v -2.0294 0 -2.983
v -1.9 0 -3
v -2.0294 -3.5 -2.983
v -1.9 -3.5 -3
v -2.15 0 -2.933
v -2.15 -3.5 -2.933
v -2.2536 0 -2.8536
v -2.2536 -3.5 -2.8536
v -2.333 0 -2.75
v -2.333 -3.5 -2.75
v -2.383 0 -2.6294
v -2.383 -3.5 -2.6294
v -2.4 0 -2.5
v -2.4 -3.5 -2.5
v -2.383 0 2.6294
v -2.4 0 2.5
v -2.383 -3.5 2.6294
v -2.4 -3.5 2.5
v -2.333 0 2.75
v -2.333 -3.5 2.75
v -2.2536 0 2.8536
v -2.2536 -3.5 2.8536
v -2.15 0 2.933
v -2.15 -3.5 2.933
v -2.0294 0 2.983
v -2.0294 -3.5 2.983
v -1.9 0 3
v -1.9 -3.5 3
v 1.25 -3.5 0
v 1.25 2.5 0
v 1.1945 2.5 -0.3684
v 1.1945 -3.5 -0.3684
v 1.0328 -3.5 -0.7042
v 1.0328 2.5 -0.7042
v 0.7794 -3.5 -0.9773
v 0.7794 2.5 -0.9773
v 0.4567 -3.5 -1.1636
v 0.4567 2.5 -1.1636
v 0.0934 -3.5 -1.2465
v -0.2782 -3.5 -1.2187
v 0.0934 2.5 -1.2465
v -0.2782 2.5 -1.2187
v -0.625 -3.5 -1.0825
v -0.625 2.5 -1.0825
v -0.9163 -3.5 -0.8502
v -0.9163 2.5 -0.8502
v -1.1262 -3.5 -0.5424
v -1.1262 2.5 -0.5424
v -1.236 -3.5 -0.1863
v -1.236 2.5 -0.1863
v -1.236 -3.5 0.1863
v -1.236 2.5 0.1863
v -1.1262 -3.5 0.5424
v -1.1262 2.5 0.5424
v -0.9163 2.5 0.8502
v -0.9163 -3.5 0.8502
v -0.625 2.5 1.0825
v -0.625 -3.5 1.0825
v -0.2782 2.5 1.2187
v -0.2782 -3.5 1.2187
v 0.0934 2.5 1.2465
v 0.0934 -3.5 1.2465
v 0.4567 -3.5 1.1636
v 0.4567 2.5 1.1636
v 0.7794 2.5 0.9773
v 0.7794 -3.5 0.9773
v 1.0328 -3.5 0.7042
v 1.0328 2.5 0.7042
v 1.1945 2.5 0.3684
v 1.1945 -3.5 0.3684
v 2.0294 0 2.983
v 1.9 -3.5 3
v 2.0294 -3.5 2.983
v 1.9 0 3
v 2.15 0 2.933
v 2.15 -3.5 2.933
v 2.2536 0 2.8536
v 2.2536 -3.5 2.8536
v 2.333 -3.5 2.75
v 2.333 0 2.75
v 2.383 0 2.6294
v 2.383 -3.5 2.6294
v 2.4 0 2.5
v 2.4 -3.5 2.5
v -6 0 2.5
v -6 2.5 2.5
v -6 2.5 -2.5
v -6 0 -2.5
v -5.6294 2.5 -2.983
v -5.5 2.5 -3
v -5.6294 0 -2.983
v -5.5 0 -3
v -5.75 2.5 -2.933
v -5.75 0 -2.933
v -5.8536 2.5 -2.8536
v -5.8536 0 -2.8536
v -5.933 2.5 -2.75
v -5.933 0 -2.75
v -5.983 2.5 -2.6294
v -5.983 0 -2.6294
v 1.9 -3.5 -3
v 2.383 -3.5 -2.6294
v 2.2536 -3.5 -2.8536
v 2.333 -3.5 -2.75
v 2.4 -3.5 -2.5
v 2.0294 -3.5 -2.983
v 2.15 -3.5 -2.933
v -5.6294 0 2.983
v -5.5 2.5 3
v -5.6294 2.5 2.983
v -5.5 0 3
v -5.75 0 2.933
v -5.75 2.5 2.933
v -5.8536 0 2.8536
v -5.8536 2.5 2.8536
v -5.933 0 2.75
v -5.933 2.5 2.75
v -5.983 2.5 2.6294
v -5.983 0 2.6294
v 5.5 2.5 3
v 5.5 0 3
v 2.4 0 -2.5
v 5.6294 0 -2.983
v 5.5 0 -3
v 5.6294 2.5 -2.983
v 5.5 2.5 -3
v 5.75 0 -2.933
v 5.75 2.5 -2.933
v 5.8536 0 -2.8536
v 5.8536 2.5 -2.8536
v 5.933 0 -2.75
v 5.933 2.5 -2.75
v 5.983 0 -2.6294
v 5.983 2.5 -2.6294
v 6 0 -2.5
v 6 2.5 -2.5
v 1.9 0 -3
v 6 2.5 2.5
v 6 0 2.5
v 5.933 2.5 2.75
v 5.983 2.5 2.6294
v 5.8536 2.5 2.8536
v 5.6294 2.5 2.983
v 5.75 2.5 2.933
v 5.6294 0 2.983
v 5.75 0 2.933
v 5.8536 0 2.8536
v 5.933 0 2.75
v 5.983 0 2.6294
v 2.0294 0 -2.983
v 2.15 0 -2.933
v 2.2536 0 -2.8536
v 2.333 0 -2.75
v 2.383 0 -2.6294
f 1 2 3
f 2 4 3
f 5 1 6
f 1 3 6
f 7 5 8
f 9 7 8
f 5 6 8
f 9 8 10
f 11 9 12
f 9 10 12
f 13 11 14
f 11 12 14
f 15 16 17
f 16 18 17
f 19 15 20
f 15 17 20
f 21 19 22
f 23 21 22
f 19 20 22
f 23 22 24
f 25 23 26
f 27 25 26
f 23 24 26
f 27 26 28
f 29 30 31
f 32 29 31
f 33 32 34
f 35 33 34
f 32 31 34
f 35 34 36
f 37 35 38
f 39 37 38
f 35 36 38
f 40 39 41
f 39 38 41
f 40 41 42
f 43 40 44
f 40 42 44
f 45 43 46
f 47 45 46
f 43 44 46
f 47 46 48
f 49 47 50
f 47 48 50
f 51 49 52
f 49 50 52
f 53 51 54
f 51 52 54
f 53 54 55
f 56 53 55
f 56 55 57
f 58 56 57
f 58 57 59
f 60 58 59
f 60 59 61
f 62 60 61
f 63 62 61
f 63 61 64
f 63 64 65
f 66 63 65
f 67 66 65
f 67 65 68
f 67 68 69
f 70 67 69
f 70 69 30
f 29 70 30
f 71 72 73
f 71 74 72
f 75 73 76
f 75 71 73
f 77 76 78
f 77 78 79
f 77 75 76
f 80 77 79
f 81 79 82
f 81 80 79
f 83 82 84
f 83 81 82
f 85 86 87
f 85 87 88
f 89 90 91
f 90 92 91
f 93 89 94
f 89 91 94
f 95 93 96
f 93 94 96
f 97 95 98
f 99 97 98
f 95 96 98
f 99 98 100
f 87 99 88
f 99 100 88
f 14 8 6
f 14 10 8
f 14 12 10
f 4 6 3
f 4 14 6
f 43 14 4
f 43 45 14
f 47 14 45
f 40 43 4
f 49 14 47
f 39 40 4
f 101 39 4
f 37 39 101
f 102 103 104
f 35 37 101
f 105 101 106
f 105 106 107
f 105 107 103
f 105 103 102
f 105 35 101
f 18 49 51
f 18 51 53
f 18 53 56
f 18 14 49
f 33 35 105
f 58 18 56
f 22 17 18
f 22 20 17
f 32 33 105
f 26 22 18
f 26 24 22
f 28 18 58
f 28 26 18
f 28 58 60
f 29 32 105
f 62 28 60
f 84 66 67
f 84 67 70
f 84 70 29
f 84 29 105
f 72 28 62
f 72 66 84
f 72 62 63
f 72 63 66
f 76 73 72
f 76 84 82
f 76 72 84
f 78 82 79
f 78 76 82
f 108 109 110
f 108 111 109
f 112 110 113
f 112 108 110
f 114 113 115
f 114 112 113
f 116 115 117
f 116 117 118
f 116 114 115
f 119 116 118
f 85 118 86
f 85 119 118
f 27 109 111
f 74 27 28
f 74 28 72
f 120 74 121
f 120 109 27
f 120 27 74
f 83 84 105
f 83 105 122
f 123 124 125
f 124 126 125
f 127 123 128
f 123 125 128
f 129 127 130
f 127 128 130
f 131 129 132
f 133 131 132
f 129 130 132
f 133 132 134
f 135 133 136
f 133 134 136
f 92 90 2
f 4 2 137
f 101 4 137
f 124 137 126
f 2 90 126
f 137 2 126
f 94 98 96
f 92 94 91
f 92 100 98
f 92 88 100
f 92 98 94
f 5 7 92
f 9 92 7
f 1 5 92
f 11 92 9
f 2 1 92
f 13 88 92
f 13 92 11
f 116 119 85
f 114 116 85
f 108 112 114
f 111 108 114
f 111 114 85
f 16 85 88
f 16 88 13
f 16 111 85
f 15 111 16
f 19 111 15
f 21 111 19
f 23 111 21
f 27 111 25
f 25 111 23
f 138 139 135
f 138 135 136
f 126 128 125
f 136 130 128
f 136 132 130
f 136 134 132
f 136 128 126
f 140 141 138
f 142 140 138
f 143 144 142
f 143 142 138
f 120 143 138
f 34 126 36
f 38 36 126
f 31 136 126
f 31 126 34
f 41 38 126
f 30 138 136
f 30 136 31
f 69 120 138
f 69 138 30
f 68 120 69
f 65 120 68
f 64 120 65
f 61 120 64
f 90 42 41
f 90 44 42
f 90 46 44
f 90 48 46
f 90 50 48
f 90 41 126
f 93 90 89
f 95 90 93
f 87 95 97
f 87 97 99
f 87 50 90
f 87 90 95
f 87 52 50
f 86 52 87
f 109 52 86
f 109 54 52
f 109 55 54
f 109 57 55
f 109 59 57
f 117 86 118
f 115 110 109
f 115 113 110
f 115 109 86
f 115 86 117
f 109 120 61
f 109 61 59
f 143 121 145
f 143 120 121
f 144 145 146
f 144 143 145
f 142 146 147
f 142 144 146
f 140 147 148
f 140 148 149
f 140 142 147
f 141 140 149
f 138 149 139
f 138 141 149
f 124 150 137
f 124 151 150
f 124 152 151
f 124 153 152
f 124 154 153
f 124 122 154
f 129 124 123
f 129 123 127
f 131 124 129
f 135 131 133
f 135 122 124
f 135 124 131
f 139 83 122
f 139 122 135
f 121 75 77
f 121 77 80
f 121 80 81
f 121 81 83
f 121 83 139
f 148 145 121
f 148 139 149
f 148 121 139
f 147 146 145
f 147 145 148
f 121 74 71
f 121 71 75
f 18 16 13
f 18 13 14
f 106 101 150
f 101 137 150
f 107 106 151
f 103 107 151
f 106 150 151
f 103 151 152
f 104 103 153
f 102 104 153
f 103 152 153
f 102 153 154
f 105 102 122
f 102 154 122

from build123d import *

# Parameters (mm, degrees)
BOSS_EXTRU_1_DEPTH      = 3
ESQUISSE2_R             = 1.25
ENL_V_MAT_EXTRU_1_DEPTH = 7
CONG_2_R                = 0.5


with BuildPart() as part:
    # Esquisse1 → Boss.-Extru.1 (new body, symmetric)
    with BuildSketch(Plane.XY):
        Polygon((-6, 0), (-2.4, 0), (-2.4, -3.5), (2.4, -3.5), (2.4, 0), (6, 0), (6, 2.5), (-6, 2.5), align=None)
    extrude(amount=BOSS_EXTRU_1_DEPTH, both=True)

    # Esquisse2 → Enlèv. mat.-Extru.1 (cut, through all)
    with BuildSketch(Plane(origin=(0, 2.5, 0), x_dir=(1, 0, 0), z_dir=(0, 1, 0))):
        Circle(ESQUISSE2_R)
    extrude(amount=-ENL_V_MAT_EXTRU_1_DEPTH, mode=Mode.SUBTRACT)

    # Congé2
    cong_2_edges = [part.edges().sort_by_distance(p)[0] for p in [
        (-6, 1.25, -3),
        (6, 1.25, -3),
        (-6, 1.25, 3),
        (-2.4, -1.75, 3),
        (2.4, -1.75, 3),
        (6, 1.25, 3),
        (2.4, -1.75, -3),
        (-2.4, -1.75, -3),
    ]]
    fillet(cong_2_edges, radius=CONG_2_R)


solid = part.part
